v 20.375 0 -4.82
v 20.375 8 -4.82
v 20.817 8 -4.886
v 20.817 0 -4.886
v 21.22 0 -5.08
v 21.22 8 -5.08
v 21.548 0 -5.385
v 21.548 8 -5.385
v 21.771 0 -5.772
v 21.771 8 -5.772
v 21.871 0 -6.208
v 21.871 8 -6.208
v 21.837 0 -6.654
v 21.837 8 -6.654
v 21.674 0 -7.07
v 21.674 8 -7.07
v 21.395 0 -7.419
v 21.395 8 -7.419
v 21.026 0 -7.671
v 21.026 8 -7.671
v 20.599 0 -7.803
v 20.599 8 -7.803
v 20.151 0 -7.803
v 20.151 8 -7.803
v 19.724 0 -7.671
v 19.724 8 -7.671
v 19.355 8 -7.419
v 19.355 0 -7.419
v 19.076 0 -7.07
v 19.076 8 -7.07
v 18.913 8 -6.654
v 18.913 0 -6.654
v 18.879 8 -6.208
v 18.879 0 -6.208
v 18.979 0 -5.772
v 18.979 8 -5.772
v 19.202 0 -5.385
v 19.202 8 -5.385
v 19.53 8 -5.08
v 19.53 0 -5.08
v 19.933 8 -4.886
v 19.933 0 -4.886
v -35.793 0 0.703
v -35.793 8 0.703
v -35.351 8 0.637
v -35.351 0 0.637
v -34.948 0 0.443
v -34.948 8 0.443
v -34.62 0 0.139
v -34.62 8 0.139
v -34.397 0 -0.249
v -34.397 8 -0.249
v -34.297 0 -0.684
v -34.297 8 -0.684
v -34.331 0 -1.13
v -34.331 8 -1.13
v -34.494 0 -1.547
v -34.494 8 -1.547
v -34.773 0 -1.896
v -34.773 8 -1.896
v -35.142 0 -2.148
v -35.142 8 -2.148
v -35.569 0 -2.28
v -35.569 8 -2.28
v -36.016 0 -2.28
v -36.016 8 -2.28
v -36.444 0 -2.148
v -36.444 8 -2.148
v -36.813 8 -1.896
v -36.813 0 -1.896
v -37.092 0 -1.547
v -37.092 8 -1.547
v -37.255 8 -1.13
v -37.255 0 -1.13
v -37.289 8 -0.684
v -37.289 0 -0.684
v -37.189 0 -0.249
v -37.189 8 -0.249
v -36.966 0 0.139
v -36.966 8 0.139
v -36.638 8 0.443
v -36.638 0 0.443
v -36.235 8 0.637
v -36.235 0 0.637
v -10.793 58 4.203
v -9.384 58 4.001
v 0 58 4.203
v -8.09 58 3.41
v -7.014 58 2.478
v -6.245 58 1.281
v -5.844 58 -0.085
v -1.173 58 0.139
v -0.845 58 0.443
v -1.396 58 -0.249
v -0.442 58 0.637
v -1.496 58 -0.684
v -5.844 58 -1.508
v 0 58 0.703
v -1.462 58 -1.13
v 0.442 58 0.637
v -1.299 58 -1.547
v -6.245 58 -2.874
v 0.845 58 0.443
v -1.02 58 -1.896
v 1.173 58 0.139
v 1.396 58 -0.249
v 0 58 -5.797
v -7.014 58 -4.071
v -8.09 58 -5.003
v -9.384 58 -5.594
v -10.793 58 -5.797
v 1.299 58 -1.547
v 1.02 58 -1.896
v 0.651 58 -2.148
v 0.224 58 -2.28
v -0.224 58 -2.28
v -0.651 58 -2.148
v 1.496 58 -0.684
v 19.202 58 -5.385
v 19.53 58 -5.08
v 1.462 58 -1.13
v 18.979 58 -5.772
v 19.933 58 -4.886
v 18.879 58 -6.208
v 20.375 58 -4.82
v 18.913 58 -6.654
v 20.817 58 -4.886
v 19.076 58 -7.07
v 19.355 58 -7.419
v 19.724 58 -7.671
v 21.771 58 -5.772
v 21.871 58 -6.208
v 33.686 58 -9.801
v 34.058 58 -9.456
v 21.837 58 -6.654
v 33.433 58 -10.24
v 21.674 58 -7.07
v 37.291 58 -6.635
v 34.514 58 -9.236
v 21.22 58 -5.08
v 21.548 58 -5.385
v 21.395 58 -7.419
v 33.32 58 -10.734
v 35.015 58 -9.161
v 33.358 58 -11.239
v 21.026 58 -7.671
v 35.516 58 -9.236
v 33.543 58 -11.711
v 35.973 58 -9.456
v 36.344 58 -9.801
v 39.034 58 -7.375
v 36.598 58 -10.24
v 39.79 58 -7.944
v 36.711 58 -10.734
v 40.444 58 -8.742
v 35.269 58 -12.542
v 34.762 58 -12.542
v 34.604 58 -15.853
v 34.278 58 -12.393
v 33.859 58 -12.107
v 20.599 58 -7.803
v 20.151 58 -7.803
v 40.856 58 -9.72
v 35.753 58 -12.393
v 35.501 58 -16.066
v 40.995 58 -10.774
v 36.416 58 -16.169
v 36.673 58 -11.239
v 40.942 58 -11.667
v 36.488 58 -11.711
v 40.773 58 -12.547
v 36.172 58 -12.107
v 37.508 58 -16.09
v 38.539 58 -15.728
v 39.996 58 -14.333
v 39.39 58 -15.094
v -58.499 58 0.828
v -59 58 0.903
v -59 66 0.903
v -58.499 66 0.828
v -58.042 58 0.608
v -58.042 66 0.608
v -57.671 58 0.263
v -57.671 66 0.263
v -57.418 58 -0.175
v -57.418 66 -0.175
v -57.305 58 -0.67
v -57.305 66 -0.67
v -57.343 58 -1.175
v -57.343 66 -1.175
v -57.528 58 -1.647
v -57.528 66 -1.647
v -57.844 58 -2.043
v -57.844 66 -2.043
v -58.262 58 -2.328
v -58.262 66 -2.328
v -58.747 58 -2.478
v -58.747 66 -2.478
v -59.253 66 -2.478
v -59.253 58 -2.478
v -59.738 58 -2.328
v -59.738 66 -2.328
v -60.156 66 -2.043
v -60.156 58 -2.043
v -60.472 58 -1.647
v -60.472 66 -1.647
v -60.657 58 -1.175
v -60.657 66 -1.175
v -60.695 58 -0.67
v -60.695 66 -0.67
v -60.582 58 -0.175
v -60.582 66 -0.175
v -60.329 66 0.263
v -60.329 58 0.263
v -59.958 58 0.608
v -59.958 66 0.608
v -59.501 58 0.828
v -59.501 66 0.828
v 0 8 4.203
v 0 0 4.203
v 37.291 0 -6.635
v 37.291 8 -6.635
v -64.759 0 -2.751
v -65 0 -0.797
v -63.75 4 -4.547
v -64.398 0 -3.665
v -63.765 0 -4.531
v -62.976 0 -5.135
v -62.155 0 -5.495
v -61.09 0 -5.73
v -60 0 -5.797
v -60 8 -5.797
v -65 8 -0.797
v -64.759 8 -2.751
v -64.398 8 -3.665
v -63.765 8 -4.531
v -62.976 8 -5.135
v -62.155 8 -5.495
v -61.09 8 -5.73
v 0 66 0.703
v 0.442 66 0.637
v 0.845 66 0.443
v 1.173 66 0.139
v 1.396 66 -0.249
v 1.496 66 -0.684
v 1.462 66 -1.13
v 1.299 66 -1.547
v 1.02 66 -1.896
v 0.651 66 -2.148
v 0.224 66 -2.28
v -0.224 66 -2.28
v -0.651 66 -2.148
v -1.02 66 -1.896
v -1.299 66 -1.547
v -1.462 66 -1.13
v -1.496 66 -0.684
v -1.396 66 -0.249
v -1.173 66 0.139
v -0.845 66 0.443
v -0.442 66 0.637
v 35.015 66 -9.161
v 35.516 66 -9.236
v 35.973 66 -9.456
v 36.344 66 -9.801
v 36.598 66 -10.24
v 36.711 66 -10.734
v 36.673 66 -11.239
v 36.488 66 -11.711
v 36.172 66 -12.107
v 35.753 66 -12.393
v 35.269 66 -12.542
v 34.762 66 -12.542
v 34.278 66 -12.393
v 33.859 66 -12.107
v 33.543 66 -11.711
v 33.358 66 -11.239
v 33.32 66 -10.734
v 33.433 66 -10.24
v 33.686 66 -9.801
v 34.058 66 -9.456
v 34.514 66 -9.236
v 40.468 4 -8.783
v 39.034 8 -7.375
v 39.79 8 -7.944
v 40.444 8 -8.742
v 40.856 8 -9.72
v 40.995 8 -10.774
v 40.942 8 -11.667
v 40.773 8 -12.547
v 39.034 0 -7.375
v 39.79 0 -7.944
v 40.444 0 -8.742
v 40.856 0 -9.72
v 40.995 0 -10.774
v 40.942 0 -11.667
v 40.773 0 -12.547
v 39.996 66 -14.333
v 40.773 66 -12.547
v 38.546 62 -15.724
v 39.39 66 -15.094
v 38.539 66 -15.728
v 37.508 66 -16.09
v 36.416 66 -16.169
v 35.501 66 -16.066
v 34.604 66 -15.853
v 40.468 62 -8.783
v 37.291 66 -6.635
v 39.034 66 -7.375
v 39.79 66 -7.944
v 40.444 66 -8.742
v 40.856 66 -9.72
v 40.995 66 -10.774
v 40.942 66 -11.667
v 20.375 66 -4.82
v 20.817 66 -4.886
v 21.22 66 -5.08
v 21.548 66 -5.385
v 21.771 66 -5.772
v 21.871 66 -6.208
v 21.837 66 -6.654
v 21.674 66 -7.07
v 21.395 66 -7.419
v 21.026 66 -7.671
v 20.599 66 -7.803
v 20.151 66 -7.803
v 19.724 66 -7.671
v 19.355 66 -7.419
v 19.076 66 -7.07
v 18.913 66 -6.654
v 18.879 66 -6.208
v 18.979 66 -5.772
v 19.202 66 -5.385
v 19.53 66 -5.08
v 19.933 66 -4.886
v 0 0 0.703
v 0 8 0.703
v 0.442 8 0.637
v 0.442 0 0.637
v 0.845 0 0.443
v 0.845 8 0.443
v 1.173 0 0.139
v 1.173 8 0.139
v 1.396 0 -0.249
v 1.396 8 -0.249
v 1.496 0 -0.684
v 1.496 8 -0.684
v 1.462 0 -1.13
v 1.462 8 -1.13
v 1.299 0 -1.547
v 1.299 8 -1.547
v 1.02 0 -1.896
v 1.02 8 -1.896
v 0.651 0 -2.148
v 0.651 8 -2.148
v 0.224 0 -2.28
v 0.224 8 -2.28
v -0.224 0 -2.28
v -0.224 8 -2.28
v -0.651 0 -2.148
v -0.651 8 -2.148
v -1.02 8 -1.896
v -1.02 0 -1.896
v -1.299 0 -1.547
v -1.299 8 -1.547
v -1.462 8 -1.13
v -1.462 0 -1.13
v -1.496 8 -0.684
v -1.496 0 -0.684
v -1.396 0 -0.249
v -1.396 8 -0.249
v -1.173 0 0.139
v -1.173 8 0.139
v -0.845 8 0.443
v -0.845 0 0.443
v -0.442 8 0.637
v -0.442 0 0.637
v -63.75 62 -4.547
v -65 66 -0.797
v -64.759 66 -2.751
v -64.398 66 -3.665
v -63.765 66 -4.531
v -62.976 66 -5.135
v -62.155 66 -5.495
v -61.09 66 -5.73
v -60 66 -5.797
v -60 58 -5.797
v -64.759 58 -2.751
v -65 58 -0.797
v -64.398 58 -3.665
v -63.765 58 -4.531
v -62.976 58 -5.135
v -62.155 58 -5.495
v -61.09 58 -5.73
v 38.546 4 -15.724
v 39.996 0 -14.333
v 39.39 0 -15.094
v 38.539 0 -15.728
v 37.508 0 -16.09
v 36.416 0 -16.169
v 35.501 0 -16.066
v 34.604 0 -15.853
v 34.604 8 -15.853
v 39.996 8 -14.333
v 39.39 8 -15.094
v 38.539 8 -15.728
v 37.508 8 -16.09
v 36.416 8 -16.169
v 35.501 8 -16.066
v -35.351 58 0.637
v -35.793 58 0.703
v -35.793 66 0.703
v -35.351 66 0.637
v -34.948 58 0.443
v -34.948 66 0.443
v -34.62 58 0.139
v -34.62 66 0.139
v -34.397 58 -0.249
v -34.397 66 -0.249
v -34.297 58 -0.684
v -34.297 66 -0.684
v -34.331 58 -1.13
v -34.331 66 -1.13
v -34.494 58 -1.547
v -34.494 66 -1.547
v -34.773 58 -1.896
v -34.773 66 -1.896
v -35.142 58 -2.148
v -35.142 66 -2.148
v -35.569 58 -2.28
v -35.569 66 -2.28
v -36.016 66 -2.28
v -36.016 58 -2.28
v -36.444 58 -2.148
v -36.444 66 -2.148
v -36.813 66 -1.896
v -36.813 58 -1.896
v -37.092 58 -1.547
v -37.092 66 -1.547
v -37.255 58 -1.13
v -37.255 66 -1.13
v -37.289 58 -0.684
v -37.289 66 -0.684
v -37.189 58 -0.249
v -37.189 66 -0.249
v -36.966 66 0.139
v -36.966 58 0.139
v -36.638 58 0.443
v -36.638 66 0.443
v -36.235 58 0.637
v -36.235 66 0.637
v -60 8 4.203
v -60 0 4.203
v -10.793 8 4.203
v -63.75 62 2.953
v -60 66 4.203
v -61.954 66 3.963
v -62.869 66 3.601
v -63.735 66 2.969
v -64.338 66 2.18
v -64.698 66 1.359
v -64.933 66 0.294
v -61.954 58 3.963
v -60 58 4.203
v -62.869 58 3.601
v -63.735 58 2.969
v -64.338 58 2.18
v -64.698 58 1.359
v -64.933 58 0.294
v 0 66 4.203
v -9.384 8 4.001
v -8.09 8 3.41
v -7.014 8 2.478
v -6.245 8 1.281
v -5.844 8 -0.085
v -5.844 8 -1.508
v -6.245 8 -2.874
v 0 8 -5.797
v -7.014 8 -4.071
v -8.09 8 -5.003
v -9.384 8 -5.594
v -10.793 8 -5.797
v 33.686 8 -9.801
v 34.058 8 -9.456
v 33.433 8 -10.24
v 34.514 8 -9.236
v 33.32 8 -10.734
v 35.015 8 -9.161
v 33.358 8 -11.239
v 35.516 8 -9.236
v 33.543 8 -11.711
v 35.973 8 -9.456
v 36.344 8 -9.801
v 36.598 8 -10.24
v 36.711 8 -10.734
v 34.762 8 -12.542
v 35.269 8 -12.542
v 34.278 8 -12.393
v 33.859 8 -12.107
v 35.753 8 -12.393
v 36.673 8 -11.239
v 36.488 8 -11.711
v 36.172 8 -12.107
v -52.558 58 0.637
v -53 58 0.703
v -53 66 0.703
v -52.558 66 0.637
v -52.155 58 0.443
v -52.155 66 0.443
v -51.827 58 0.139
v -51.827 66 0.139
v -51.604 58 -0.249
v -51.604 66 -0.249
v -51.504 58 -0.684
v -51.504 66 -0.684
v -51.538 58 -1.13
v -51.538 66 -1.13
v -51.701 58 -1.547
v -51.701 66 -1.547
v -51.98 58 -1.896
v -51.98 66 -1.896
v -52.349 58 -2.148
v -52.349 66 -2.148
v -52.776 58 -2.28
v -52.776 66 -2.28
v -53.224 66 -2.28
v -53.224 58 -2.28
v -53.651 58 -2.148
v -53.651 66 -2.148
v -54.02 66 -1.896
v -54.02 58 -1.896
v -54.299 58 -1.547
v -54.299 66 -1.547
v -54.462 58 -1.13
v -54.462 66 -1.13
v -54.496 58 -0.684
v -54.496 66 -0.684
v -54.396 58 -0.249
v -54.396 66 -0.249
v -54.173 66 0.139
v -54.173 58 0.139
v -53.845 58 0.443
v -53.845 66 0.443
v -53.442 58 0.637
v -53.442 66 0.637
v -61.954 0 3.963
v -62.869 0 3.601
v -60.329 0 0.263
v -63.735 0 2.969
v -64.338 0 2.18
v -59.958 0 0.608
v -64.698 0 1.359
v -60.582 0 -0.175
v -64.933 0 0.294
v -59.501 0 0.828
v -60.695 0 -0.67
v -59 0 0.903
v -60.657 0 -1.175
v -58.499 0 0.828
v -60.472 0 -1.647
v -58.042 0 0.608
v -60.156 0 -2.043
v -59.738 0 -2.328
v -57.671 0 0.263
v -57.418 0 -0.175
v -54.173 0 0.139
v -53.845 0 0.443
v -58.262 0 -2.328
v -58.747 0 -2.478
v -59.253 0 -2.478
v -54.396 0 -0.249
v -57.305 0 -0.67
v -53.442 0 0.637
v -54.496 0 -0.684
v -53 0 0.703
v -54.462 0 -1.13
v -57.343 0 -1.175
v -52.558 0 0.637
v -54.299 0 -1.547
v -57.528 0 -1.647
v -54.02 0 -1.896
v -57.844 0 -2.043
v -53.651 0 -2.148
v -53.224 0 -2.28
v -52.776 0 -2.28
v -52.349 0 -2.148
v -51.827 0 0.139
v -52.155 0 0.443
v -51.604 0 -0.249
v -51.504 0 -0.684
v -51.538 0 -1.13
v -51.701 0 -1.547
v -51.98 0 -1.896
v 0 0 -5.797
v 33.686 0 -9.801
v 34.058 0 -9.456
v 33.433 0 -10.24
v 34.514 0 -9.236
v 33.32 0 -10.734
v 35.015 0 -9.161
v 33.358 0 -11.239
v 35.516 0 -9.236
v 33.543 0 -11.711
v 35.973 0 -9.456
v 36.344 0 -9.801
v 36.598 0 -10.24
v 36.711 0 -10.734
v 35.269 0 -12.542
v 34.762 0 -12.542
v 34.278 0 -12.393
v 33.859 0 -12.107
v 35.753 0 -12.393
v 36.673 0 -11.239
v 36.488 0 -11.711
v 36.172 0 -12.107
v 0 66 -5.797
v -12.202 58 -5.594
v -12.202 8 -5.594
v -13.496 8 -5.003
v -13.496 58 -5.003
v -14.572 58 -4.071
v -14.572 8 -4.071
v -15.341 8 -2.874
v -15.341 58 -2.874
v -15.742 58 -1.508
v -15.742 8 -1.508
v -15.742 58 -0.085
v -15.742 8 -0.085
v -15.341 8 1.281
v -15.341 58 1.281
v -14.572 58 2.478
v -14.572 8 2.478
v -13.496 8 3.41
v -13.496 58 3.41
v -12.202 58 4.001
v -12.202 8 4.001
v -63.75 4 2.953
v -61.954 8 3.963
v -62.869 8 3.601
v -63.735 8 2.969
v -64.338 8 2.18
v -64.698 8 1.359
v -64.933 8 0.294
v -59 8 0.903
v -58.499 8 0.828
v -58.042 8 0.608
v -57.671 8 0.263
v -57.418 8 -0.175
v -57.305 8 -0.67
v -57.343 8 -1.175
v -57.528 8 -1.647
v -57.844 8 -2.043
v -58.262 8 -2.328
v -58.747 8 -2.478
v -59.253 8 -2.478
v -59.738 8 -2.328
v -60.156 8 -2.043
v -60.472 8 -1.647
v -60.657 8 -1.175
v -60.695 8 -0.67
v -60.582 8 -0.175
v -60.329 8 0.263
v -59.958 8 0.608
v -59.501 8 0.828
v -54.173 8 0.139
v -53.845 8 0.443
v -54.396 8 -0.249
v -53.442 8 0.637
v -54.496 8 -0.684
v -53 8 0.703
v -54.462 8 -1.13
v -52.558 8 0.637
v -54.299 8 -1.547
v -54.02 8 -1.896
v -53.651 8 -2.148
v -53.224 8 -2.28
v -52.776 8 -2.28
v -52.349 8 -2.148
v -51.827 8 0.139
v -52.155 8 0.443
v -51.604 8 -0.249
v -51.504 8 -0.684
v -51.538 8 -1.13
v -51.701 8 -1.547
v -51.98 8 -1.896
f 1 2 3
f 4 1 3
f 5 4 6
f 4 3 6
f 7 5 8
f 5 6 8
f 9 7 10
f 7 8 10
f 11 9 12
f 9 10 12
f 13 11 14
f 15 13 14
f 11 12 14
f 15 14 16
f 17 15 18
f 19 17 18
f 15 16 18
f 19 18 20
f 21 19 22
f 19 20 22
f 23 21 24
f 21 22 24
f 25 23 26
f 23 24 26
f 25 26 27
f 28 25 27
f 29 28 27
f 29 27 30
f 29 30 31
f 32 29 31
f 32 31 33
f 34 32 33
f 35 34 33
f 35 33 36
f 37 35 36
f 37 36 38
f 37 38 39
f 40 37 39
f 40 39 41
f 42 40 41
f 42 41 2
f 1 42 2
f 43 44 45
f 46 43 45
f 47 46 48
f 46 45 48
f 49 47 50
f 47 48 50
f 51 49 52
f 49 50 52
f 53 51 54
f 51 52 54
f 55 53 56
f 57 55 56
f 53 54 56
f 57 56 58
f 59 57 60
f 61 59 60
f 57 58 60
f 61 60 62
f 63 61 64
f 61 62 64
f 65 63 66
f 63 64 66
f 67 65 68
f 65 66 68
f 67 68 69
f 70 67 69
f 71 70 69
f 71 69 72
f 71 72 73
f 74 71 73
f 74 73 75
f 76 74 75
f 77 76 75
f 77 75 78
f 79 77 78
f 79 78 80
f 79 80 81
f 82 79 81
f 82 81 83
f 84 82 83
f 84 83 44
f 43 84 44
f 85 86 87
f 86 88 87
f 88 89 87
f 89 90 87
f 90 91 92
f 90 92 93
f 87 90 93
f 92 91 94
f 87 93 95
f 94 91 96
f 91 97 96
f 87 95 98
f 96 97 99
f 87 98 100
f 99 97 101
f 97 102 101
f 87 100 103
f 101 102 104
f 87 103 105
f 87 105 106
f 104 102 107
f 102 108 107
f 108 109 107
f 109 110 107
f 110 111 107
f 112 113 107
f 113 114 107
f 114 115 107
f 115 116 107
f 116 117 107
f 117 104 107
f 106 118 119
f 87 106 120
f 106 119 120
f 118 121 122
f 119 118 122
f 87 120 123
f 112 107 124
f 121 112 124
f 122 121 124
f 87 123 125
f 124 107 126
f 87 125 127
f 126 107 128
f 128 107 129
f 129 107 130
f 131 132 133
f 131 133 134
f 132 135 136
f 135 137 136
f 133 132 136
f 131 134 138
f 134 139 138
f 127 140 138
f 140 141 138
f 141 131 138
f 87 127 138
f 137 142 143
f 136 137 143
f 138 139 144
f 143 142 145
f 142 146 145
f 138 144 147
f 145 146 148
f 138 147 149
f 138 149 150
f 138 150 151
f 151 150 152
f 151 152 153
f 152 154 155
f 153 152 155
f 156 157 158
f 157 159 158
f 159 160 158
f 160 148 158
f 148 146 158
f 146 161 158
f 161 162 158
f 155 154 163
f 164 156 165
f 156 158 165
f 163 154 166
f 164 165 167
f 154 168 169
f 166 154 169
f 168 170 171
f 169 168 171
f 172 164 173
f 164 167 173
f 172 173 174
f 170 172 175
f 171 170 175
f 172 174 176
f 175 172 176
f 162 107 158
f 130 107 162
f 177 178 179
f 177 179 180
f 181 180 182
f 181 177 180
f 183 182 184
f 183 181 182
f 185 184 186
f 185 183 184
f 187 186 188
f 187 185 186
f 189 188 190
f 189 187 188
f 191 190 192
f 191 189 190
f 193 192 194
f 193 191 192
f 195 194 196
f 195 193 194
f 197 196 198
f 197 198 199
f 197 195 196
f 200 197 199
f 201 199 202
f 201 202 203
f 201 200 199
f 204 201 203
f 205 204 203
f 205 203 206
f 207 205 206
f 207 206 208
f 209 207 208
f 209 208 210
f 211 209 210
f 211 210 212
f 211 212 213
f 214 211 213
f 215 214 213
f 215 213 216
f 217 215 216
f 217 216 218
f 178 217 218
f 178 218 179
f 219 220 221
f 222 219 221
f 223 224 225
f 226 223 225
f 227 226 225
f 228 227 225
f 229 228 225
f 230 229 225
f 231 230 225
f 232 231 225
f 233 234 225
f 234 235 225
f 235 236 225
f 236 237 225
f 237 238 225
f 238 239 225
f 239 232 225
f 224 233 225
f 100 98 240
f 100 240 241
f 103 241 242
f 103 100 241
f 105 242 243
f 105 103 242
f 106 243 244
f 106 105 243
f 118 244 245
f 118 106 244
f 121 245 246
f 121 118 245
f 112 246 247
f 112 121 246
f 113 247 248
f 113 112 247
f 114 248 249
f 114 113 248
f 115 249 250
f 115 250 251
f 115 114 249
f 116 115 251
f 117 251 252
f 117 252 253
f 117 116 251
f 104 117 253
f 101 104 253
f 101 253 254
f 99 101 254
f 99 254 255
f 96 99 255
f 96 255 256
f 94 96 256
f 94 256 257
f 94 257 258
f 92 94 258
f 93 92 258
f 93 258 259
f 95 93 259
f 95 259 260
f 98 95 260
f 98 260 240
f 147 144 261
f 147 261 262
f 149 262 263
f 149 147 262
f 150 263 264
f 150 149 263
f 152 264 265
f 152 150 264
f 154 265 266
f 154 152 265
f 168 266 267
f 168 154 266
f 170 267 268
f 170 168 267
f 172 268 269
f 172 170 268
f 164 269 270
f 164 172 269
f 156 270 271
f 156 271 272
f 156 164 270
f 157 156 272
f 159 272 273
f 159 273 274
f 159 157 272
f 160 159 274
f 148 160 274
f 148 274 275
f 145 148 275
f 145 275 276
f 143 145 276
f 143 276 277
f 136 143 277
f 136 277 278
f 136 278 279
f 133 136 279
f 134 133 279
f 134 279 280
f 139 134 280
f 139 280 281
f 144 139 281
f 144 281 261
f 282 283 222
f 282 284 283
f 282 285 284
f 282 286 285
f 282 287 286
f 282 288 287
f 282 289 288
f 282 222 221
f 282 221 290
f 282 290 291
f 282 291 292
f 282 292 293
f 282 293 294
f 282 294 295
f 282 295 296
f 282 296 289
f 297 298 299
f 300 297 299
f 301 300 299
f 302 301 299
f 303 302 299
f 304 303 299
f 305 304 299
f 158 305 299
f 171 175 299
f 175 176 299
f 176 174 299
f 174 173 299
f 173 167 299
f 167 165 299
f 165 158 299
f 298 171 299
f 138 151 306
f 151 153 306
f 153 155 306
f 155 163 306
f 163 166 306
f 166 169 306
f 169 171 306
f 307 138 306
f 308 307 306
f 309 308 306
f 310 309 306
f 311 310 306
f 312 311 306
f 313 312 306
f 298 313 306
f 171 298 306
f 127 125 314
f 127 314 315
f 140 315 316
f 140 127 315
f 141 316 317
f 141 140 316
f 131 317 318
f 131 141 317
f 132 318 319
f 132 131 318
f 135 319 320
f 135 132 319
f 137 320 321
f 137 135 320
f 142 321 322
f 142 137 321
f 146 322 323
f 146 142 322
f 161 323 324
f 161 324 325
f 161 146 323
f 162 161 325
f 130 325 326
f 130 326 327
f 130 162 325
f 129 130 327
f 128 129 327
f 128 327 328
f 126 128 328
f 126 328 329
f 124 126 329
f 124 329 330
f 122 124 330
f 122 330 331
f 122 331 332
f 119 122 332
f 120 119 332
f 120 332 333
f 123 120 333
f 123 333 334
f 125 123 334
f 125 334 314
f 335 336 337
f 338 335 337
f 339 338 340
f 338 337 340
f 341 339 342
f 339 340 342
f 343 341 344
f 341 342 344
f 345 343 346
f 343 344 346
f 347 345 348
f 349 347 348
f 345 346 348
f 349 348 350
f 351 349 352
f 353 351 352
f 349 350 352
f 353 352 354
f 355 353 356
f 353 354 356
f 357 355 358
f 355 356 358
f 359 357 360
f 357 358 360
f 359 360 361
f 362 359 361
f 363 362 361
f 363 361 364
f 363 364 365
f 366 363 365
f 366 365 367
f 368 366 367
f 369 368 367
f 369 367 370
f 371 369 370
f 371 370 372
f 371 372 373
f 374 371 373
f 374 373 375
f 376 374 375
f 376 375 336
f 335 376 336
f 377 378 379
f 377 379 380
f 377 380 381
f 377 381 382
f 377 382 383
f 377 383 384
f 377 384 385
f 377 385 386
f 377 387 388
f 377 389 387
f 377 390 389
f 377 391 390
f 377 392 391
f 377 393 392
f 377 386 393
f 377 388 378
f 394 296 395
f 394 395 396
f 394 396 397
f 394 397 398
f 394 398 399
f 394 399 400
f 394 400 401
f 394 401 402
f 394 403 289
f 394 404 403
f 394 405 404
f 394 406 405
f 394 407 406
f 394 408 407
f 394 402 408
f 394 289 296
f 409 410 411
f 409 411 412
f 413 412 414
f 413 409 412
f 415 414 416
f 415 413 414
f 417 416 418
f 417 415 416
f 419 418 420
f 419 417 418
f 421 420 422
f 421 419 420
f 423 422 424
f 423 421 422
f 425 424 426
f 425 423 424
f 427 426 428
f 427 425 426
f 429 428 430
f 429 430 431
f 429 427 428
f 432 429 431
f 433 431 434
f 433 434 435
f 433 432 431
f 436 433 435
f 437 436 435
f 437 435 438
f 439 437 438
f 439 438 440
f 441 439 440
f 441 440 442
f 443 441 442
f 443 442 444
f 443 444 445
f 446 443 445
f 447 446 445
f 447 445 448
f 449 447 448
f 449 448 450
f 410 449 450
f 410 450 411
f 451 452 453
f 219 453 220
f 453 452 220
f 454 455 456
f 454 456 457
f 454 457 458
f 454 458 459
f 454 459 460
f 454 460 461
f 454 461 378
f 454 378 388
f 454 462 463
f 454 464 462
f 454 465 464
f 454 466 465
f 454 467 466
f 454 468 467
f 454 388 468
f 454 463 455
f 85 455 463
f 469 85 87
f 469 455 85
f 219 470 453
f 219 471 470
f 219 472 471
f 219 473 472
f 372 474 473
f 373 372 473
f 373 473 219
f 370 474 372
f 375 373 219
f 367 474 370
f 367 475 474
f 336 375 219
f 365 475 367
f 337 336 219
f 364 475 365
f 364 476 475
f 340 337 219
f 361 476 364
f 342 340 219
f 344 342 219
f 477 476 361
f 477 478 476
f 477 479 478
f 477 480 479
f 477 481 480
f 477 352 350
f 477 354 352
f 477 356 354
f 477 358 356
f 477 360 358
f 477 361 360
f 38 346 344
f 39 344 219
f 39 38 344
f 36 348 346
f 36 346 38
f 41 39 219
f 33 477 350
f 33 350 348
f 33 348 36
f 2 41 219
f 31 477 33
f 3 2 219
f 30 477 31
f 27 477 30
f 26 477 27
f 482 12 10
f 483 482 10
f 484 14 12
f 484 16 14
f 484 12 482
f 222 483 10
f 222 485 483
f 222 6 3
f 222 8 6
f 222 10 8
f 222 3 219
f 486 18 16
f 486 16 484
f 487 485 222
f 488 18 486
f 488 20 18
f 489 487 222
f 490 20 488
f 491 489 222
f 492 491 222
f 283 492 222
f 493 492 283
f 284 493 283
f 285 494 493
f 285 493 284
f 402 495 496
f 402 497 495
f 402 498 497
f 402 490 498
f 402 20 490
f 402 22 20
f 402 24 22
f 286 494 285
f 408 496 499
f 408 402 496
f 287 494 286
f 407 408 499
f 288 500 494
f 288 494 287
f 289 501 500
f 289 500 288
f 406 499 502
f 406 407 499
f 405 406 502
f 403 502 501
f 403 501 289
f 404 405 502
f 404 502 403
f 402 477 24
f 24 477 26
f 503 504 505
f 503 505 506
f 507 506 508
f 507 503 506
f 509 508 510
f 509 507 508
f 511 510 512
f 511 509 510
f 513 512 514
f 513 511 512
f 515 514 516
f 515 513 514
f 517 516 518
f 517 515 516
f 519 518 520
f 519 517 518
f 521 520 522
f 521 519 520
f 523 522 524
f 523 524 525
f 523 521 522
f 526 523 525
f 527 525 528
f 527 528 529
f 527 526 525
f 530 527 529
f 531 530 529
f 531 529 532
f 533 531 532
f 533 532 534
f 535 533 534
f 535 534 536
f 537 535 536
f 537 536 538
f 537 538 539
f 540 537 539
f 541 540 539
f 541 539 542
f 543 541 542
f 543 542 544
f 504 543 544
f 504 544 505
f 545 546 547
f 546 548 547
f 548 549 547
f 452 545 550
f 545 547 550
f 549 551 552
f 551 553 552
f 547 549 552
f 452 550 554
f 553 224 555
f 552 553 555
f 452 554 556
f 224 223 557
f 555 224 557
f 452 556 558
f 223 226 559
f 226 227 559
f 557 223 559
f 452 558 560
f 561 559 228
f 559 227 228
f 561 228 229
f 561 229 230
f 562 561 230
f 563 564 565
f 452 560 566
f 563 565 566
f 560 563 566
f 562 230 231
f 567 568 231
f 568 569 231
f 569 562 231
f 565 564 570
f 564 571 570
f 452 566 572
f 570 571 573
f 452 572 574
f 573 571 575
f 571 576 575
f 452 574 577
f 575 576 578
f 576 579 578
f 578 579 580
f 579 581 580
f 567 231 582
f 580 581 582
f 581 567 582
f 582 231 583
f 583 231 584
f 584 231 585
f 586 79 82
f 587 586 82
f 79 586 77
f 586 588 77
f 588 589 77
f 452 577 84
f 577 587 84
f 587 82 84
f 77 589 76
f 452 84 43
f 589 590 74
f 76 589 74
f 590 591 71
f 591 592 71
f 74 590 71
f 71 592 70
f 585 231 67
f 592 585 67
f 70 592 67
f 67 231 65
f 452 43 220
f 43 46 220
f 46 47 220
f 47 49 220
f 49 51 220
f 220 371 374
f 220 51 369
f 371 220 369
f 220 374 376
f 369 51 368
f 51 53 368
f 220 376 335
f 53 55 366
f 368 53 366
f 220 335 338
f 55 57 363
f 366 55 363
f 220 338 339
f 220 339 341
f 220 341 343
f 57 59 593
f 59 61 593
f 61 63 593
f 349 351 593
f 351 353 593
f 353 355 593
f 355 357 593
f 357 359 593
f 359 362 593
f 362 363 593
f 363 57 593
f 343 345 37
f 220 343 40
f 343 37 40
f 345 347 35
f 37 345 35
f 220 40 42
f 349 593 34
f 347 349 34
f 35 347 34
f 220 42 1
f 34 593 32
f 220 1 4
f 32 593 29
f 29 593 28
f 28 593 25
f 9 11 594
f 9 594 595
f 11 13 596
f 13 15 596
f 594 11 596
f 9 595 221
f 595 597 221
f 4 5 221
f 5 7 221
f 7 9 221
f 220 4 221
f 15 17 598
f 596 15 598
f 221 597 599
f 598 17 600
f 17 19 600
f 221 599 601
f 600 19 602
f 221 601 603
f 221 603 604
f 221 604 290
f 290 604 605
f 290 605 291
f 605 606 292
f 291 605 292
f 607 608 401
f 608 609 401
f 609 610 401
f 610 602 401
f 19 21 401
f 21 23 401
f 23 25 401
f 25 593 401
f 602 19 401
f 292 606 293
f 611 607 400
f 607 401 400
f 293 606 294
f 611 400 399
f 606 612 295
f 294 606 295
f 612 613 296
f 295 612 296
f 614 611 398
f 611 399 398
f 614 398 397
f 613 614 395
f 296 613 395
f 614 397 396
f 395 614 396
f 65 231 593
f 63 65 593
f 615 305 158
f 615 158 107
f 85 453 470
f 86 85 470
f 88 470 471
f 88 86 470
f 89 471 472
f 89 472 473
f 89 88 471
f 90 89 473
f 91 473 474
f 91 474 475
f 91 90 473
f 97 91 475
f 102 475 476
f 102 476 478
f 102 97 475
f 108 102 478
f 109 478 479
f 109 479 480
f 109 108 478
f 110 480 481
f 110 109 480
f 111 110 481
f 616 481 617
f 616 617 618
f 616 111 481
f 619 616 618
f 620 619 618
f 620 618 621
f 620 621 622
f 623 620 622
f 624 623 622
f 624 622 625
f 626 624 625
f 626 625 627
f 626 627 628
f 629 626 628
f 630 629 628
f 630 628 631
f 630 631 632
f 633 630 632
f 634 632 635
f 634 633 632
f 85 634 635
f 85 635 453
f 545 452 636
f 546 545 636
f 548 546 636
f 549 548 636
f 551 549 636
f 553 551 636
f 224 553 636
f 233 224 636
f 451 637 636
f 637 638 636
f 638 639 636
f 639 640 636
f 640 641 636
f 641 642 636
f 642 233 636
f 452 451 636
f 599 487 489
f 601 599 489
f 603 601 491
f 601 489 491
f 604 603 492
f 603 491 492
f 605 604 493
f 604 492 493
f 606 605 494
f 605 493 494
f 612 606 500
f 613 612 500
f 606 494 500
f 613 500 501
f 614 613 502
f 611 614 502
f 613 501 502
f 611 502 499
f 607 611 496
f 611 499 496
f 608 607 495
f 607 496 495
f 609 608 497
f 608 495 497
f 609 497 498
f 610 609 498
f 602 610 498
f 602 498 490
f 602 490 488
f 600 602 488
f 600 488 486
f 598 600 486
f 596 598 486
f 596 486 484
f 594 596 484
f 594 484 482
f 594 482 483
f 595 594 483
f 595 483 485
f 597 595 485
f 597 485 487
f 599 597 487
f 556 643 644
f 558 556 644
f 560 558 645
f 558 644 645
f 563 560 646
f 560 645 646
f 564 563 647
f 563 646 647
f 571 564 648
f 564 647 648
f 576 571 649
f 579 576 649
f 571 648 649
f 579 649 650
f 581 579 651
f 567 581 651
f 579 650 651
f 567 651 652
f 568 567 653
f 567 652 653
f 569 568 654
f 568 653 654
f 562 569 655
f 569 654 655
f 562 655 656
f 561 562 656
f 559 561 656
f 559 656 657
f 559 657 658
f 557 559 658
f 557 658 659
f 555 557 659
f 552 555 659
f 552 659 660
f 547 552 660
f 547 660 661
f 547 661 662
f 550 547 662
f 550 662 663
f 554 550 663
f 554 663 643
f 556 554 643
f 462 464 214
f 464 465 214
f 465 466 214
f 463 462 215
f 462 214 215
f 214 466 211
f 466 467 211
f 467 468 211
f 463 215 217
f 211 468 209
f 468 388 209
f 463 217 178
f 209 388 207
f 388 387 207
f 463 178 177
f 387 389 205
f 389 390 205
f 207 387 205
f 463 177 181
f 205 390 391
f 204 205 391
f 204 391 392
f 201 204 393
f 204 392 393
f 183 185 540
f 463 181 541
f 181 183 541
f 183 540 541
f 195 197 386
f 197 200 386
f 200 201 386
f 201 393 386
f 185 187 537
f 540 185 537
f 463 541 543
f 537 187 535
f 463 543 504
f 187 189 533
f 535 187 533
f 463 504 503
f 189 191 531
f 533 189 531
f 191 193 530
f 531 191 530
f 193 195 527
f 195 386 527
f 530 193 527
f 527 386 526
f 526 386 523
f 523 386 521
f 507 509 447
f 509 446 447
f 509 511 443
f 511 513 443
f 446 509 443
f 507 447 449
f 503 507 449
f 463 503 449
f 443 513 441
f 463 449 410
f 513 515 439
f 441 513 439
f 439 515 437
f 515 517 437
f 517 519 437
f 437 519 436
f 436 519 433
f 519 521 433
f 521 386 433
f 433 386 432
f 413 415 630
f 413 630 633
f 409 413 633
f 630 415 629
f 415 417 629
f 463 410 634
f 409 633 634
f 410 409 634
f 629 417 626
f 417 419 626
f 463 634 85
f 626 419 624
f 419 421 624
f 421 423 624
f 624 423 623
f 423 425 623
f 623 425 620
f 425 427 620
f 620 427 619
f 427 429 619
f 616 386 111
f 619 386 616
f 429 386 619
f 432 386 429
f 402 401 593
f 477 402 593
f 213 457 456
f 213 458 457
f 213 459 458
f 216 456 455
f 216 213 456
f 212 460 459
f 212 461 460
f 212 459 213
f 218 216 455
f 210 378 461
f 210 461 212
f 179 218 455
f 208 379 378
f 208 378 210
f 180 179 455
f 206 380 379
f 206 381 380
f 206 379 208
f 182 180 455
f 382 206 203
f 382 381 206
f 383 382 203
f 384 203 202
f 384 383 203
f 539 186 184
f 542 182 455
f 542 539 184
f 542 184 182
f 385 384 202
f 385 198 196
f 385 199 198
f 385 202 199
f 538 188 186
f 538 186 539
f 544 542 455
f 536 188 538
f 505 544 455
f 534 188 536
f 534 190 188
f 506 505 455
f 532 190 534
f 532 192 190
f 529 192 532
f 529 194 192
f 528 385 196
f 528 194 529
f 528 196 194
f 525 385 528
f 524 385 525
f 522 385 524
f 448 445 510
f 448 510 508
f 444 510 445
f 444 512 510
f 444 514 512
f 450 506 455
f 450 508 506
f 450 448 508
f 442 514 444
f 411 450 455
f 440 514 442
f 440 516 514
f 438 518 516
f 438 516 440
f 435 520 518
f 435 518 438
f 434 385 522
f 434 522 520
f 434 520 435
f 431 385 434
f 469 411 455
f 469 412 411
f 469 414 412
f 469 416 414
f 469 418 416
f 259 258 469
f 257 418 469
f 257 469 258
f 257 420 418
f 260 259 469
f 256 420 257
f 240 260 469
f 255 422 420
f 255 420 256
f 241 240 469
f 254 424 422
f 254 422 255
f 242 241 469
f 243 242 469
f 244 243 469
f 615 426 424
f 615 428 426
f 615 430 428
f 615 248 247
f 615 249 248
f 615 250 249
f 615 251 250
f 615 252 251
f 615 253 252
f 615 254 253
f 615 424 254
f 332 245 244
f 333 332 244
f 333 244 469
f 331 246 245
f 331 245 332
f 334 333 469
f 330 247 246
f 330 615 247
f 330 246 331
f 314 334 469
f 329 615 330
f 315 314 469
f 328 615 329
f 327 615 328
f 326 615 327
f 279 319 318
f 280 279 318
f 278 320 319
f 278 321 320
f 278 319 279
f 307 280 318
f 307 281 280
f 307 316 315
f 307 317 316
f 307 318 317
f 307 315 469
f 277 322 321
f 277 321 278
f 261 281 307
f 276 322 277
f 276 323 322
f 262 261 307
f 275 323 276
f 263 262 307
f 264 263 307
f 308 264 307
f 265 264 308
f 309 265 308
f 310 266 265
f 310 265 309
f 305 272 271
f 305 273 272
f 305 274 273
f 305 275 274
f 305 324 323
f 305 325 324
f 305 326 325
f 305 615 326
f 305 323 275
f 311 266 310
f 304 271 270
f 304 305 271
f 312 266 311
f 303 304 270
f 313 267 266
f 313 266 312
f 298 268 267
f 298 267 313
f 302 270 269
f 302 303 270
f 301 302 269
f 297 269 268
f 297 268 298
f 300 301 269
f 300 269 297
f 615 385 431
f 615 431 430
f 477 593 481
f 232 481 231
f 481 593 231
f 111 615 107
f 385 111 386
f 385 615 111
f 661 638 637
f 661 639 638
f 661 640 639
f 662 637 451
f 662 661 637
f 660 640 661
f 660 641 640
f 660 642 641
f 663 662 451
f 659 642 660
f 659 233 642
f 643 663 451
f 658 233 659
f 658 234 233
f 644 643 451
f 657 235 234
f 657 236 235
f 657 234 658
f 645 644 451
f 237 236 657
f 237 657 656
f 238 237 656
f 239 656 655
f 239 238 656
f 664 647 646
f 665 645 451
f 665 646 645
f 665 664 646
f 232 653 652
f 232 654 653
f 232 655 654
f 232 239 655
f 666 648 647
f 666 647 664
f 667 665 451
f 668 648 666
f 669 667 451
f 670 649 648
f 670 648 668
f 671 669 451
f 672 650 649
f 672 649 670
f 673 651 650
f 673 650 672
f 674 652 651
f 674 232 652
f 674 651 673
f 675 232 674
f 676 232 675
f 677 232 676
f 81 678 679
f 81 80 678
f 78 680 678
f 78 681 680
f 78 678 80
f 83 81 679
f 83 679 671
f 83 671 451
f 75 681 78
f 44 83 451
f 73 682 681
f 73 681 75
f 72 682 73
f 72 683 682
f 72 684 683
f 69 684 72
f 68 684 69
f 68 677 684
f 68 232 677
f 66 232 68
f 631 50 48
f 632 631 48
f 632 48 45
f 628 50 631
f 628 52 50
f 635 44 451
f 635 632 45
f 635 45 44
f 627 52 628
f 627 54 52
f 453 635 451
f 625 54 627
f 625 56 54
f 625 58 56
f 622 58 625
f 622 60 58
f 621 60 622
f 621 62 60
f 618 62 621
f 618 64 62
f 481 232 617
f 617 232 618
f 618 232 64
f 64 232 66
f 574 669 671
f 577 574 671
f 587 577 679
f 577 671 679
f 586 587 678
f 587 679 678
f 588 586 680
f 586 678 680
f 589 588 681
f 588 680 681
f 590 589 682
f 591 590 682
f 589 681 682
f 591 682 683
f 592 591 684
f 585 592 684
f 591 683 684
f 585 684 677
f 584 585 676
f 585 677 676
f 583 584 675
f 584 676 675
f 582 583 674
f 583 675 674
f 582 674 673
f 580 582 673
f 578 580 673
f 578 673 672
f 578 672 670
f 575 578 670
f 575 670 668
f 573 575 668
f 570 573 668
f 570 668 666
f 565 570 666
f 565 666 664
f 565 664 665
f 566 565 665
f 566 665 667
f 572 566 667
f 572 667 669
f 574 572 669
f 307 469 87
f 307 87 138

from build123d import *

# Parameters (mm, degrees)
BOSS_EXTRUDE1_DEPTH = 8
SKETCH2_R           = 1.7
SKETCH2_R_2         = 1.5
CUT_EXTRUDE1_DEPTH  = 10
FILLET1_SIZE        = 5
SKETCH3_R           = 5
BOSS_EXTRUDE2_DEPTH = 25


with BuildPart() as part:
    # Sketch1 → Boss-Extrude1 (new body)
    with BuildSketch(Plane(origin=(0, 0, 0), x_dir=(1, 0, 0), z_dir=(0, 1, 0))):
        Polygon((0, 5.796570021), (-65, 5.796570021), (-65, -4.203429979), (0, -4.203429979), (42, 8.002969552), (39.5, 17.276398151), align=None)
    extrude(amount=BOSS_EXTRUDE1_DEPTH)

    # Sketch2 → Cut-Extrude1 (cut)
    with BuildSketch(Plane(origin=(0, 8, 0), x_dir=(1, 0, 0), z_dir=(0, 1, 0))):
        with Locations(Location((-59, 0.796570021, 0), (0, 0, 270))):
            Circle(SKETCH2_R)
        with Locations(Location((-53, 0.796570021, 0), (0, 0, 270))):
            Circle(SKETCH2_R_2)
        with Locations(Location((-35.792921067, 0.796570021, 0), (0, 0, 270))):
            Circle(SKETCH2_R_2)
        with Locations(Location((20.375, 6.319841926, 0), (0, 0, 270))):
            Circle(SKETCH2_R_2)
        with Locations(Location((35.015323176, 10.860923065, 0), (0, 0, 270))):
            Circle(SKETCH2_R)
        with Locations(Location((0, 0.796570021, 0), (0, 0, 270))):
            Circle(SKETCH2_R_2)
    extrude(amount=-CUT_EXTRUDE1_DEPTH, mode=Mode.SUBTRACT)

    # Fillet1
    # a fillet whose section is not a circle: 5 mm, written as the material it takes off along each edge
    with BuildSketch(Plane(origin=(-65, -12.5, 4.203429979), x_dir=(0, 0, -1), z_dir=(0, 1, 0)), Plane(origin=(-65, -12.5, -5.796570021), x_dir=(1, 0, 0), z_dir=(0, 1, 0))) as fillet1_piece_1:
        with BuildLine():
            Bezier((FILLET1_SIZE, 0), (0, 0), (0, -FILLET1_SIZE), weights=[1, 1, 1])
            Line((0, -FILLET1_SIZE), (0, 0))
            Line((0, 0), (FILLET1_SIZE, 0))
        make_face()
    extrude(amount=33, mode=Mode.SUBTRACT)

    # Fillet2
    # a fillet whose section is not a circle: 5 mm, written as the material it takes off along each edge
    with BuildSketch(Plane(origin=(39.5, -12.746283343, -17.276398151), x_dir=(-0.9602675163397548, 0, 0.27908116572545455), z_dir=(0, 1, 0))) as fillet2_piece_1:
        with BuildLine():
            Bezier((5.098513337, 0), (0, 0), (0.099464892, 5.097543034), weights=[1, 1, 1])
            Line((0.099464892, 5.097543034), (0, 0))
            Line((0, 0), (5.098513337, 0))
        make_face()
    extrude(amount=33.492566686, mode=Mode.SUBTRACT)
    with BuildSketch(Plane(origin=(42, -12.258475337, -8.002969552), x_dir=(-0.2602945720874772, 0, -0.9655292516241013), z_dir=(0, 1, 0))) as fillet2_piece_2:
        with BuildLine():
            Bezier((4.903390135, 0), (0, 0), (-0.09565831, 4.902456966), weights=[1, 1, 1])
            Line((-0.09565831, 4.902456966), (0, 0))
            Line((0, 0), (4.903390135, 0))
        make_face()
    extrude(amount=32.516950674, mode=Mode.SUBTRACT)

    # Sketch3 → Boss-Extrude2 (add)
    with BuildSketch(Plane(origin=(0, 8, 0), x_dir=(1, 0, 0), z_dir=(0, 1, 0))):
        with Locations(Location((-10.792921067, 0.796570021, 0), (0, 0, 270))):
            Circle(SKETCH3_R)
    extrude(amount=BOSS_EXTRUDE2_DEPTH)

    # Mirror3: part across plane


with BuildPart() as part_1:
    add(part.part)
    add(part.part.mirror(Plane.ZX.offset(33)))


solid = part_1.part
